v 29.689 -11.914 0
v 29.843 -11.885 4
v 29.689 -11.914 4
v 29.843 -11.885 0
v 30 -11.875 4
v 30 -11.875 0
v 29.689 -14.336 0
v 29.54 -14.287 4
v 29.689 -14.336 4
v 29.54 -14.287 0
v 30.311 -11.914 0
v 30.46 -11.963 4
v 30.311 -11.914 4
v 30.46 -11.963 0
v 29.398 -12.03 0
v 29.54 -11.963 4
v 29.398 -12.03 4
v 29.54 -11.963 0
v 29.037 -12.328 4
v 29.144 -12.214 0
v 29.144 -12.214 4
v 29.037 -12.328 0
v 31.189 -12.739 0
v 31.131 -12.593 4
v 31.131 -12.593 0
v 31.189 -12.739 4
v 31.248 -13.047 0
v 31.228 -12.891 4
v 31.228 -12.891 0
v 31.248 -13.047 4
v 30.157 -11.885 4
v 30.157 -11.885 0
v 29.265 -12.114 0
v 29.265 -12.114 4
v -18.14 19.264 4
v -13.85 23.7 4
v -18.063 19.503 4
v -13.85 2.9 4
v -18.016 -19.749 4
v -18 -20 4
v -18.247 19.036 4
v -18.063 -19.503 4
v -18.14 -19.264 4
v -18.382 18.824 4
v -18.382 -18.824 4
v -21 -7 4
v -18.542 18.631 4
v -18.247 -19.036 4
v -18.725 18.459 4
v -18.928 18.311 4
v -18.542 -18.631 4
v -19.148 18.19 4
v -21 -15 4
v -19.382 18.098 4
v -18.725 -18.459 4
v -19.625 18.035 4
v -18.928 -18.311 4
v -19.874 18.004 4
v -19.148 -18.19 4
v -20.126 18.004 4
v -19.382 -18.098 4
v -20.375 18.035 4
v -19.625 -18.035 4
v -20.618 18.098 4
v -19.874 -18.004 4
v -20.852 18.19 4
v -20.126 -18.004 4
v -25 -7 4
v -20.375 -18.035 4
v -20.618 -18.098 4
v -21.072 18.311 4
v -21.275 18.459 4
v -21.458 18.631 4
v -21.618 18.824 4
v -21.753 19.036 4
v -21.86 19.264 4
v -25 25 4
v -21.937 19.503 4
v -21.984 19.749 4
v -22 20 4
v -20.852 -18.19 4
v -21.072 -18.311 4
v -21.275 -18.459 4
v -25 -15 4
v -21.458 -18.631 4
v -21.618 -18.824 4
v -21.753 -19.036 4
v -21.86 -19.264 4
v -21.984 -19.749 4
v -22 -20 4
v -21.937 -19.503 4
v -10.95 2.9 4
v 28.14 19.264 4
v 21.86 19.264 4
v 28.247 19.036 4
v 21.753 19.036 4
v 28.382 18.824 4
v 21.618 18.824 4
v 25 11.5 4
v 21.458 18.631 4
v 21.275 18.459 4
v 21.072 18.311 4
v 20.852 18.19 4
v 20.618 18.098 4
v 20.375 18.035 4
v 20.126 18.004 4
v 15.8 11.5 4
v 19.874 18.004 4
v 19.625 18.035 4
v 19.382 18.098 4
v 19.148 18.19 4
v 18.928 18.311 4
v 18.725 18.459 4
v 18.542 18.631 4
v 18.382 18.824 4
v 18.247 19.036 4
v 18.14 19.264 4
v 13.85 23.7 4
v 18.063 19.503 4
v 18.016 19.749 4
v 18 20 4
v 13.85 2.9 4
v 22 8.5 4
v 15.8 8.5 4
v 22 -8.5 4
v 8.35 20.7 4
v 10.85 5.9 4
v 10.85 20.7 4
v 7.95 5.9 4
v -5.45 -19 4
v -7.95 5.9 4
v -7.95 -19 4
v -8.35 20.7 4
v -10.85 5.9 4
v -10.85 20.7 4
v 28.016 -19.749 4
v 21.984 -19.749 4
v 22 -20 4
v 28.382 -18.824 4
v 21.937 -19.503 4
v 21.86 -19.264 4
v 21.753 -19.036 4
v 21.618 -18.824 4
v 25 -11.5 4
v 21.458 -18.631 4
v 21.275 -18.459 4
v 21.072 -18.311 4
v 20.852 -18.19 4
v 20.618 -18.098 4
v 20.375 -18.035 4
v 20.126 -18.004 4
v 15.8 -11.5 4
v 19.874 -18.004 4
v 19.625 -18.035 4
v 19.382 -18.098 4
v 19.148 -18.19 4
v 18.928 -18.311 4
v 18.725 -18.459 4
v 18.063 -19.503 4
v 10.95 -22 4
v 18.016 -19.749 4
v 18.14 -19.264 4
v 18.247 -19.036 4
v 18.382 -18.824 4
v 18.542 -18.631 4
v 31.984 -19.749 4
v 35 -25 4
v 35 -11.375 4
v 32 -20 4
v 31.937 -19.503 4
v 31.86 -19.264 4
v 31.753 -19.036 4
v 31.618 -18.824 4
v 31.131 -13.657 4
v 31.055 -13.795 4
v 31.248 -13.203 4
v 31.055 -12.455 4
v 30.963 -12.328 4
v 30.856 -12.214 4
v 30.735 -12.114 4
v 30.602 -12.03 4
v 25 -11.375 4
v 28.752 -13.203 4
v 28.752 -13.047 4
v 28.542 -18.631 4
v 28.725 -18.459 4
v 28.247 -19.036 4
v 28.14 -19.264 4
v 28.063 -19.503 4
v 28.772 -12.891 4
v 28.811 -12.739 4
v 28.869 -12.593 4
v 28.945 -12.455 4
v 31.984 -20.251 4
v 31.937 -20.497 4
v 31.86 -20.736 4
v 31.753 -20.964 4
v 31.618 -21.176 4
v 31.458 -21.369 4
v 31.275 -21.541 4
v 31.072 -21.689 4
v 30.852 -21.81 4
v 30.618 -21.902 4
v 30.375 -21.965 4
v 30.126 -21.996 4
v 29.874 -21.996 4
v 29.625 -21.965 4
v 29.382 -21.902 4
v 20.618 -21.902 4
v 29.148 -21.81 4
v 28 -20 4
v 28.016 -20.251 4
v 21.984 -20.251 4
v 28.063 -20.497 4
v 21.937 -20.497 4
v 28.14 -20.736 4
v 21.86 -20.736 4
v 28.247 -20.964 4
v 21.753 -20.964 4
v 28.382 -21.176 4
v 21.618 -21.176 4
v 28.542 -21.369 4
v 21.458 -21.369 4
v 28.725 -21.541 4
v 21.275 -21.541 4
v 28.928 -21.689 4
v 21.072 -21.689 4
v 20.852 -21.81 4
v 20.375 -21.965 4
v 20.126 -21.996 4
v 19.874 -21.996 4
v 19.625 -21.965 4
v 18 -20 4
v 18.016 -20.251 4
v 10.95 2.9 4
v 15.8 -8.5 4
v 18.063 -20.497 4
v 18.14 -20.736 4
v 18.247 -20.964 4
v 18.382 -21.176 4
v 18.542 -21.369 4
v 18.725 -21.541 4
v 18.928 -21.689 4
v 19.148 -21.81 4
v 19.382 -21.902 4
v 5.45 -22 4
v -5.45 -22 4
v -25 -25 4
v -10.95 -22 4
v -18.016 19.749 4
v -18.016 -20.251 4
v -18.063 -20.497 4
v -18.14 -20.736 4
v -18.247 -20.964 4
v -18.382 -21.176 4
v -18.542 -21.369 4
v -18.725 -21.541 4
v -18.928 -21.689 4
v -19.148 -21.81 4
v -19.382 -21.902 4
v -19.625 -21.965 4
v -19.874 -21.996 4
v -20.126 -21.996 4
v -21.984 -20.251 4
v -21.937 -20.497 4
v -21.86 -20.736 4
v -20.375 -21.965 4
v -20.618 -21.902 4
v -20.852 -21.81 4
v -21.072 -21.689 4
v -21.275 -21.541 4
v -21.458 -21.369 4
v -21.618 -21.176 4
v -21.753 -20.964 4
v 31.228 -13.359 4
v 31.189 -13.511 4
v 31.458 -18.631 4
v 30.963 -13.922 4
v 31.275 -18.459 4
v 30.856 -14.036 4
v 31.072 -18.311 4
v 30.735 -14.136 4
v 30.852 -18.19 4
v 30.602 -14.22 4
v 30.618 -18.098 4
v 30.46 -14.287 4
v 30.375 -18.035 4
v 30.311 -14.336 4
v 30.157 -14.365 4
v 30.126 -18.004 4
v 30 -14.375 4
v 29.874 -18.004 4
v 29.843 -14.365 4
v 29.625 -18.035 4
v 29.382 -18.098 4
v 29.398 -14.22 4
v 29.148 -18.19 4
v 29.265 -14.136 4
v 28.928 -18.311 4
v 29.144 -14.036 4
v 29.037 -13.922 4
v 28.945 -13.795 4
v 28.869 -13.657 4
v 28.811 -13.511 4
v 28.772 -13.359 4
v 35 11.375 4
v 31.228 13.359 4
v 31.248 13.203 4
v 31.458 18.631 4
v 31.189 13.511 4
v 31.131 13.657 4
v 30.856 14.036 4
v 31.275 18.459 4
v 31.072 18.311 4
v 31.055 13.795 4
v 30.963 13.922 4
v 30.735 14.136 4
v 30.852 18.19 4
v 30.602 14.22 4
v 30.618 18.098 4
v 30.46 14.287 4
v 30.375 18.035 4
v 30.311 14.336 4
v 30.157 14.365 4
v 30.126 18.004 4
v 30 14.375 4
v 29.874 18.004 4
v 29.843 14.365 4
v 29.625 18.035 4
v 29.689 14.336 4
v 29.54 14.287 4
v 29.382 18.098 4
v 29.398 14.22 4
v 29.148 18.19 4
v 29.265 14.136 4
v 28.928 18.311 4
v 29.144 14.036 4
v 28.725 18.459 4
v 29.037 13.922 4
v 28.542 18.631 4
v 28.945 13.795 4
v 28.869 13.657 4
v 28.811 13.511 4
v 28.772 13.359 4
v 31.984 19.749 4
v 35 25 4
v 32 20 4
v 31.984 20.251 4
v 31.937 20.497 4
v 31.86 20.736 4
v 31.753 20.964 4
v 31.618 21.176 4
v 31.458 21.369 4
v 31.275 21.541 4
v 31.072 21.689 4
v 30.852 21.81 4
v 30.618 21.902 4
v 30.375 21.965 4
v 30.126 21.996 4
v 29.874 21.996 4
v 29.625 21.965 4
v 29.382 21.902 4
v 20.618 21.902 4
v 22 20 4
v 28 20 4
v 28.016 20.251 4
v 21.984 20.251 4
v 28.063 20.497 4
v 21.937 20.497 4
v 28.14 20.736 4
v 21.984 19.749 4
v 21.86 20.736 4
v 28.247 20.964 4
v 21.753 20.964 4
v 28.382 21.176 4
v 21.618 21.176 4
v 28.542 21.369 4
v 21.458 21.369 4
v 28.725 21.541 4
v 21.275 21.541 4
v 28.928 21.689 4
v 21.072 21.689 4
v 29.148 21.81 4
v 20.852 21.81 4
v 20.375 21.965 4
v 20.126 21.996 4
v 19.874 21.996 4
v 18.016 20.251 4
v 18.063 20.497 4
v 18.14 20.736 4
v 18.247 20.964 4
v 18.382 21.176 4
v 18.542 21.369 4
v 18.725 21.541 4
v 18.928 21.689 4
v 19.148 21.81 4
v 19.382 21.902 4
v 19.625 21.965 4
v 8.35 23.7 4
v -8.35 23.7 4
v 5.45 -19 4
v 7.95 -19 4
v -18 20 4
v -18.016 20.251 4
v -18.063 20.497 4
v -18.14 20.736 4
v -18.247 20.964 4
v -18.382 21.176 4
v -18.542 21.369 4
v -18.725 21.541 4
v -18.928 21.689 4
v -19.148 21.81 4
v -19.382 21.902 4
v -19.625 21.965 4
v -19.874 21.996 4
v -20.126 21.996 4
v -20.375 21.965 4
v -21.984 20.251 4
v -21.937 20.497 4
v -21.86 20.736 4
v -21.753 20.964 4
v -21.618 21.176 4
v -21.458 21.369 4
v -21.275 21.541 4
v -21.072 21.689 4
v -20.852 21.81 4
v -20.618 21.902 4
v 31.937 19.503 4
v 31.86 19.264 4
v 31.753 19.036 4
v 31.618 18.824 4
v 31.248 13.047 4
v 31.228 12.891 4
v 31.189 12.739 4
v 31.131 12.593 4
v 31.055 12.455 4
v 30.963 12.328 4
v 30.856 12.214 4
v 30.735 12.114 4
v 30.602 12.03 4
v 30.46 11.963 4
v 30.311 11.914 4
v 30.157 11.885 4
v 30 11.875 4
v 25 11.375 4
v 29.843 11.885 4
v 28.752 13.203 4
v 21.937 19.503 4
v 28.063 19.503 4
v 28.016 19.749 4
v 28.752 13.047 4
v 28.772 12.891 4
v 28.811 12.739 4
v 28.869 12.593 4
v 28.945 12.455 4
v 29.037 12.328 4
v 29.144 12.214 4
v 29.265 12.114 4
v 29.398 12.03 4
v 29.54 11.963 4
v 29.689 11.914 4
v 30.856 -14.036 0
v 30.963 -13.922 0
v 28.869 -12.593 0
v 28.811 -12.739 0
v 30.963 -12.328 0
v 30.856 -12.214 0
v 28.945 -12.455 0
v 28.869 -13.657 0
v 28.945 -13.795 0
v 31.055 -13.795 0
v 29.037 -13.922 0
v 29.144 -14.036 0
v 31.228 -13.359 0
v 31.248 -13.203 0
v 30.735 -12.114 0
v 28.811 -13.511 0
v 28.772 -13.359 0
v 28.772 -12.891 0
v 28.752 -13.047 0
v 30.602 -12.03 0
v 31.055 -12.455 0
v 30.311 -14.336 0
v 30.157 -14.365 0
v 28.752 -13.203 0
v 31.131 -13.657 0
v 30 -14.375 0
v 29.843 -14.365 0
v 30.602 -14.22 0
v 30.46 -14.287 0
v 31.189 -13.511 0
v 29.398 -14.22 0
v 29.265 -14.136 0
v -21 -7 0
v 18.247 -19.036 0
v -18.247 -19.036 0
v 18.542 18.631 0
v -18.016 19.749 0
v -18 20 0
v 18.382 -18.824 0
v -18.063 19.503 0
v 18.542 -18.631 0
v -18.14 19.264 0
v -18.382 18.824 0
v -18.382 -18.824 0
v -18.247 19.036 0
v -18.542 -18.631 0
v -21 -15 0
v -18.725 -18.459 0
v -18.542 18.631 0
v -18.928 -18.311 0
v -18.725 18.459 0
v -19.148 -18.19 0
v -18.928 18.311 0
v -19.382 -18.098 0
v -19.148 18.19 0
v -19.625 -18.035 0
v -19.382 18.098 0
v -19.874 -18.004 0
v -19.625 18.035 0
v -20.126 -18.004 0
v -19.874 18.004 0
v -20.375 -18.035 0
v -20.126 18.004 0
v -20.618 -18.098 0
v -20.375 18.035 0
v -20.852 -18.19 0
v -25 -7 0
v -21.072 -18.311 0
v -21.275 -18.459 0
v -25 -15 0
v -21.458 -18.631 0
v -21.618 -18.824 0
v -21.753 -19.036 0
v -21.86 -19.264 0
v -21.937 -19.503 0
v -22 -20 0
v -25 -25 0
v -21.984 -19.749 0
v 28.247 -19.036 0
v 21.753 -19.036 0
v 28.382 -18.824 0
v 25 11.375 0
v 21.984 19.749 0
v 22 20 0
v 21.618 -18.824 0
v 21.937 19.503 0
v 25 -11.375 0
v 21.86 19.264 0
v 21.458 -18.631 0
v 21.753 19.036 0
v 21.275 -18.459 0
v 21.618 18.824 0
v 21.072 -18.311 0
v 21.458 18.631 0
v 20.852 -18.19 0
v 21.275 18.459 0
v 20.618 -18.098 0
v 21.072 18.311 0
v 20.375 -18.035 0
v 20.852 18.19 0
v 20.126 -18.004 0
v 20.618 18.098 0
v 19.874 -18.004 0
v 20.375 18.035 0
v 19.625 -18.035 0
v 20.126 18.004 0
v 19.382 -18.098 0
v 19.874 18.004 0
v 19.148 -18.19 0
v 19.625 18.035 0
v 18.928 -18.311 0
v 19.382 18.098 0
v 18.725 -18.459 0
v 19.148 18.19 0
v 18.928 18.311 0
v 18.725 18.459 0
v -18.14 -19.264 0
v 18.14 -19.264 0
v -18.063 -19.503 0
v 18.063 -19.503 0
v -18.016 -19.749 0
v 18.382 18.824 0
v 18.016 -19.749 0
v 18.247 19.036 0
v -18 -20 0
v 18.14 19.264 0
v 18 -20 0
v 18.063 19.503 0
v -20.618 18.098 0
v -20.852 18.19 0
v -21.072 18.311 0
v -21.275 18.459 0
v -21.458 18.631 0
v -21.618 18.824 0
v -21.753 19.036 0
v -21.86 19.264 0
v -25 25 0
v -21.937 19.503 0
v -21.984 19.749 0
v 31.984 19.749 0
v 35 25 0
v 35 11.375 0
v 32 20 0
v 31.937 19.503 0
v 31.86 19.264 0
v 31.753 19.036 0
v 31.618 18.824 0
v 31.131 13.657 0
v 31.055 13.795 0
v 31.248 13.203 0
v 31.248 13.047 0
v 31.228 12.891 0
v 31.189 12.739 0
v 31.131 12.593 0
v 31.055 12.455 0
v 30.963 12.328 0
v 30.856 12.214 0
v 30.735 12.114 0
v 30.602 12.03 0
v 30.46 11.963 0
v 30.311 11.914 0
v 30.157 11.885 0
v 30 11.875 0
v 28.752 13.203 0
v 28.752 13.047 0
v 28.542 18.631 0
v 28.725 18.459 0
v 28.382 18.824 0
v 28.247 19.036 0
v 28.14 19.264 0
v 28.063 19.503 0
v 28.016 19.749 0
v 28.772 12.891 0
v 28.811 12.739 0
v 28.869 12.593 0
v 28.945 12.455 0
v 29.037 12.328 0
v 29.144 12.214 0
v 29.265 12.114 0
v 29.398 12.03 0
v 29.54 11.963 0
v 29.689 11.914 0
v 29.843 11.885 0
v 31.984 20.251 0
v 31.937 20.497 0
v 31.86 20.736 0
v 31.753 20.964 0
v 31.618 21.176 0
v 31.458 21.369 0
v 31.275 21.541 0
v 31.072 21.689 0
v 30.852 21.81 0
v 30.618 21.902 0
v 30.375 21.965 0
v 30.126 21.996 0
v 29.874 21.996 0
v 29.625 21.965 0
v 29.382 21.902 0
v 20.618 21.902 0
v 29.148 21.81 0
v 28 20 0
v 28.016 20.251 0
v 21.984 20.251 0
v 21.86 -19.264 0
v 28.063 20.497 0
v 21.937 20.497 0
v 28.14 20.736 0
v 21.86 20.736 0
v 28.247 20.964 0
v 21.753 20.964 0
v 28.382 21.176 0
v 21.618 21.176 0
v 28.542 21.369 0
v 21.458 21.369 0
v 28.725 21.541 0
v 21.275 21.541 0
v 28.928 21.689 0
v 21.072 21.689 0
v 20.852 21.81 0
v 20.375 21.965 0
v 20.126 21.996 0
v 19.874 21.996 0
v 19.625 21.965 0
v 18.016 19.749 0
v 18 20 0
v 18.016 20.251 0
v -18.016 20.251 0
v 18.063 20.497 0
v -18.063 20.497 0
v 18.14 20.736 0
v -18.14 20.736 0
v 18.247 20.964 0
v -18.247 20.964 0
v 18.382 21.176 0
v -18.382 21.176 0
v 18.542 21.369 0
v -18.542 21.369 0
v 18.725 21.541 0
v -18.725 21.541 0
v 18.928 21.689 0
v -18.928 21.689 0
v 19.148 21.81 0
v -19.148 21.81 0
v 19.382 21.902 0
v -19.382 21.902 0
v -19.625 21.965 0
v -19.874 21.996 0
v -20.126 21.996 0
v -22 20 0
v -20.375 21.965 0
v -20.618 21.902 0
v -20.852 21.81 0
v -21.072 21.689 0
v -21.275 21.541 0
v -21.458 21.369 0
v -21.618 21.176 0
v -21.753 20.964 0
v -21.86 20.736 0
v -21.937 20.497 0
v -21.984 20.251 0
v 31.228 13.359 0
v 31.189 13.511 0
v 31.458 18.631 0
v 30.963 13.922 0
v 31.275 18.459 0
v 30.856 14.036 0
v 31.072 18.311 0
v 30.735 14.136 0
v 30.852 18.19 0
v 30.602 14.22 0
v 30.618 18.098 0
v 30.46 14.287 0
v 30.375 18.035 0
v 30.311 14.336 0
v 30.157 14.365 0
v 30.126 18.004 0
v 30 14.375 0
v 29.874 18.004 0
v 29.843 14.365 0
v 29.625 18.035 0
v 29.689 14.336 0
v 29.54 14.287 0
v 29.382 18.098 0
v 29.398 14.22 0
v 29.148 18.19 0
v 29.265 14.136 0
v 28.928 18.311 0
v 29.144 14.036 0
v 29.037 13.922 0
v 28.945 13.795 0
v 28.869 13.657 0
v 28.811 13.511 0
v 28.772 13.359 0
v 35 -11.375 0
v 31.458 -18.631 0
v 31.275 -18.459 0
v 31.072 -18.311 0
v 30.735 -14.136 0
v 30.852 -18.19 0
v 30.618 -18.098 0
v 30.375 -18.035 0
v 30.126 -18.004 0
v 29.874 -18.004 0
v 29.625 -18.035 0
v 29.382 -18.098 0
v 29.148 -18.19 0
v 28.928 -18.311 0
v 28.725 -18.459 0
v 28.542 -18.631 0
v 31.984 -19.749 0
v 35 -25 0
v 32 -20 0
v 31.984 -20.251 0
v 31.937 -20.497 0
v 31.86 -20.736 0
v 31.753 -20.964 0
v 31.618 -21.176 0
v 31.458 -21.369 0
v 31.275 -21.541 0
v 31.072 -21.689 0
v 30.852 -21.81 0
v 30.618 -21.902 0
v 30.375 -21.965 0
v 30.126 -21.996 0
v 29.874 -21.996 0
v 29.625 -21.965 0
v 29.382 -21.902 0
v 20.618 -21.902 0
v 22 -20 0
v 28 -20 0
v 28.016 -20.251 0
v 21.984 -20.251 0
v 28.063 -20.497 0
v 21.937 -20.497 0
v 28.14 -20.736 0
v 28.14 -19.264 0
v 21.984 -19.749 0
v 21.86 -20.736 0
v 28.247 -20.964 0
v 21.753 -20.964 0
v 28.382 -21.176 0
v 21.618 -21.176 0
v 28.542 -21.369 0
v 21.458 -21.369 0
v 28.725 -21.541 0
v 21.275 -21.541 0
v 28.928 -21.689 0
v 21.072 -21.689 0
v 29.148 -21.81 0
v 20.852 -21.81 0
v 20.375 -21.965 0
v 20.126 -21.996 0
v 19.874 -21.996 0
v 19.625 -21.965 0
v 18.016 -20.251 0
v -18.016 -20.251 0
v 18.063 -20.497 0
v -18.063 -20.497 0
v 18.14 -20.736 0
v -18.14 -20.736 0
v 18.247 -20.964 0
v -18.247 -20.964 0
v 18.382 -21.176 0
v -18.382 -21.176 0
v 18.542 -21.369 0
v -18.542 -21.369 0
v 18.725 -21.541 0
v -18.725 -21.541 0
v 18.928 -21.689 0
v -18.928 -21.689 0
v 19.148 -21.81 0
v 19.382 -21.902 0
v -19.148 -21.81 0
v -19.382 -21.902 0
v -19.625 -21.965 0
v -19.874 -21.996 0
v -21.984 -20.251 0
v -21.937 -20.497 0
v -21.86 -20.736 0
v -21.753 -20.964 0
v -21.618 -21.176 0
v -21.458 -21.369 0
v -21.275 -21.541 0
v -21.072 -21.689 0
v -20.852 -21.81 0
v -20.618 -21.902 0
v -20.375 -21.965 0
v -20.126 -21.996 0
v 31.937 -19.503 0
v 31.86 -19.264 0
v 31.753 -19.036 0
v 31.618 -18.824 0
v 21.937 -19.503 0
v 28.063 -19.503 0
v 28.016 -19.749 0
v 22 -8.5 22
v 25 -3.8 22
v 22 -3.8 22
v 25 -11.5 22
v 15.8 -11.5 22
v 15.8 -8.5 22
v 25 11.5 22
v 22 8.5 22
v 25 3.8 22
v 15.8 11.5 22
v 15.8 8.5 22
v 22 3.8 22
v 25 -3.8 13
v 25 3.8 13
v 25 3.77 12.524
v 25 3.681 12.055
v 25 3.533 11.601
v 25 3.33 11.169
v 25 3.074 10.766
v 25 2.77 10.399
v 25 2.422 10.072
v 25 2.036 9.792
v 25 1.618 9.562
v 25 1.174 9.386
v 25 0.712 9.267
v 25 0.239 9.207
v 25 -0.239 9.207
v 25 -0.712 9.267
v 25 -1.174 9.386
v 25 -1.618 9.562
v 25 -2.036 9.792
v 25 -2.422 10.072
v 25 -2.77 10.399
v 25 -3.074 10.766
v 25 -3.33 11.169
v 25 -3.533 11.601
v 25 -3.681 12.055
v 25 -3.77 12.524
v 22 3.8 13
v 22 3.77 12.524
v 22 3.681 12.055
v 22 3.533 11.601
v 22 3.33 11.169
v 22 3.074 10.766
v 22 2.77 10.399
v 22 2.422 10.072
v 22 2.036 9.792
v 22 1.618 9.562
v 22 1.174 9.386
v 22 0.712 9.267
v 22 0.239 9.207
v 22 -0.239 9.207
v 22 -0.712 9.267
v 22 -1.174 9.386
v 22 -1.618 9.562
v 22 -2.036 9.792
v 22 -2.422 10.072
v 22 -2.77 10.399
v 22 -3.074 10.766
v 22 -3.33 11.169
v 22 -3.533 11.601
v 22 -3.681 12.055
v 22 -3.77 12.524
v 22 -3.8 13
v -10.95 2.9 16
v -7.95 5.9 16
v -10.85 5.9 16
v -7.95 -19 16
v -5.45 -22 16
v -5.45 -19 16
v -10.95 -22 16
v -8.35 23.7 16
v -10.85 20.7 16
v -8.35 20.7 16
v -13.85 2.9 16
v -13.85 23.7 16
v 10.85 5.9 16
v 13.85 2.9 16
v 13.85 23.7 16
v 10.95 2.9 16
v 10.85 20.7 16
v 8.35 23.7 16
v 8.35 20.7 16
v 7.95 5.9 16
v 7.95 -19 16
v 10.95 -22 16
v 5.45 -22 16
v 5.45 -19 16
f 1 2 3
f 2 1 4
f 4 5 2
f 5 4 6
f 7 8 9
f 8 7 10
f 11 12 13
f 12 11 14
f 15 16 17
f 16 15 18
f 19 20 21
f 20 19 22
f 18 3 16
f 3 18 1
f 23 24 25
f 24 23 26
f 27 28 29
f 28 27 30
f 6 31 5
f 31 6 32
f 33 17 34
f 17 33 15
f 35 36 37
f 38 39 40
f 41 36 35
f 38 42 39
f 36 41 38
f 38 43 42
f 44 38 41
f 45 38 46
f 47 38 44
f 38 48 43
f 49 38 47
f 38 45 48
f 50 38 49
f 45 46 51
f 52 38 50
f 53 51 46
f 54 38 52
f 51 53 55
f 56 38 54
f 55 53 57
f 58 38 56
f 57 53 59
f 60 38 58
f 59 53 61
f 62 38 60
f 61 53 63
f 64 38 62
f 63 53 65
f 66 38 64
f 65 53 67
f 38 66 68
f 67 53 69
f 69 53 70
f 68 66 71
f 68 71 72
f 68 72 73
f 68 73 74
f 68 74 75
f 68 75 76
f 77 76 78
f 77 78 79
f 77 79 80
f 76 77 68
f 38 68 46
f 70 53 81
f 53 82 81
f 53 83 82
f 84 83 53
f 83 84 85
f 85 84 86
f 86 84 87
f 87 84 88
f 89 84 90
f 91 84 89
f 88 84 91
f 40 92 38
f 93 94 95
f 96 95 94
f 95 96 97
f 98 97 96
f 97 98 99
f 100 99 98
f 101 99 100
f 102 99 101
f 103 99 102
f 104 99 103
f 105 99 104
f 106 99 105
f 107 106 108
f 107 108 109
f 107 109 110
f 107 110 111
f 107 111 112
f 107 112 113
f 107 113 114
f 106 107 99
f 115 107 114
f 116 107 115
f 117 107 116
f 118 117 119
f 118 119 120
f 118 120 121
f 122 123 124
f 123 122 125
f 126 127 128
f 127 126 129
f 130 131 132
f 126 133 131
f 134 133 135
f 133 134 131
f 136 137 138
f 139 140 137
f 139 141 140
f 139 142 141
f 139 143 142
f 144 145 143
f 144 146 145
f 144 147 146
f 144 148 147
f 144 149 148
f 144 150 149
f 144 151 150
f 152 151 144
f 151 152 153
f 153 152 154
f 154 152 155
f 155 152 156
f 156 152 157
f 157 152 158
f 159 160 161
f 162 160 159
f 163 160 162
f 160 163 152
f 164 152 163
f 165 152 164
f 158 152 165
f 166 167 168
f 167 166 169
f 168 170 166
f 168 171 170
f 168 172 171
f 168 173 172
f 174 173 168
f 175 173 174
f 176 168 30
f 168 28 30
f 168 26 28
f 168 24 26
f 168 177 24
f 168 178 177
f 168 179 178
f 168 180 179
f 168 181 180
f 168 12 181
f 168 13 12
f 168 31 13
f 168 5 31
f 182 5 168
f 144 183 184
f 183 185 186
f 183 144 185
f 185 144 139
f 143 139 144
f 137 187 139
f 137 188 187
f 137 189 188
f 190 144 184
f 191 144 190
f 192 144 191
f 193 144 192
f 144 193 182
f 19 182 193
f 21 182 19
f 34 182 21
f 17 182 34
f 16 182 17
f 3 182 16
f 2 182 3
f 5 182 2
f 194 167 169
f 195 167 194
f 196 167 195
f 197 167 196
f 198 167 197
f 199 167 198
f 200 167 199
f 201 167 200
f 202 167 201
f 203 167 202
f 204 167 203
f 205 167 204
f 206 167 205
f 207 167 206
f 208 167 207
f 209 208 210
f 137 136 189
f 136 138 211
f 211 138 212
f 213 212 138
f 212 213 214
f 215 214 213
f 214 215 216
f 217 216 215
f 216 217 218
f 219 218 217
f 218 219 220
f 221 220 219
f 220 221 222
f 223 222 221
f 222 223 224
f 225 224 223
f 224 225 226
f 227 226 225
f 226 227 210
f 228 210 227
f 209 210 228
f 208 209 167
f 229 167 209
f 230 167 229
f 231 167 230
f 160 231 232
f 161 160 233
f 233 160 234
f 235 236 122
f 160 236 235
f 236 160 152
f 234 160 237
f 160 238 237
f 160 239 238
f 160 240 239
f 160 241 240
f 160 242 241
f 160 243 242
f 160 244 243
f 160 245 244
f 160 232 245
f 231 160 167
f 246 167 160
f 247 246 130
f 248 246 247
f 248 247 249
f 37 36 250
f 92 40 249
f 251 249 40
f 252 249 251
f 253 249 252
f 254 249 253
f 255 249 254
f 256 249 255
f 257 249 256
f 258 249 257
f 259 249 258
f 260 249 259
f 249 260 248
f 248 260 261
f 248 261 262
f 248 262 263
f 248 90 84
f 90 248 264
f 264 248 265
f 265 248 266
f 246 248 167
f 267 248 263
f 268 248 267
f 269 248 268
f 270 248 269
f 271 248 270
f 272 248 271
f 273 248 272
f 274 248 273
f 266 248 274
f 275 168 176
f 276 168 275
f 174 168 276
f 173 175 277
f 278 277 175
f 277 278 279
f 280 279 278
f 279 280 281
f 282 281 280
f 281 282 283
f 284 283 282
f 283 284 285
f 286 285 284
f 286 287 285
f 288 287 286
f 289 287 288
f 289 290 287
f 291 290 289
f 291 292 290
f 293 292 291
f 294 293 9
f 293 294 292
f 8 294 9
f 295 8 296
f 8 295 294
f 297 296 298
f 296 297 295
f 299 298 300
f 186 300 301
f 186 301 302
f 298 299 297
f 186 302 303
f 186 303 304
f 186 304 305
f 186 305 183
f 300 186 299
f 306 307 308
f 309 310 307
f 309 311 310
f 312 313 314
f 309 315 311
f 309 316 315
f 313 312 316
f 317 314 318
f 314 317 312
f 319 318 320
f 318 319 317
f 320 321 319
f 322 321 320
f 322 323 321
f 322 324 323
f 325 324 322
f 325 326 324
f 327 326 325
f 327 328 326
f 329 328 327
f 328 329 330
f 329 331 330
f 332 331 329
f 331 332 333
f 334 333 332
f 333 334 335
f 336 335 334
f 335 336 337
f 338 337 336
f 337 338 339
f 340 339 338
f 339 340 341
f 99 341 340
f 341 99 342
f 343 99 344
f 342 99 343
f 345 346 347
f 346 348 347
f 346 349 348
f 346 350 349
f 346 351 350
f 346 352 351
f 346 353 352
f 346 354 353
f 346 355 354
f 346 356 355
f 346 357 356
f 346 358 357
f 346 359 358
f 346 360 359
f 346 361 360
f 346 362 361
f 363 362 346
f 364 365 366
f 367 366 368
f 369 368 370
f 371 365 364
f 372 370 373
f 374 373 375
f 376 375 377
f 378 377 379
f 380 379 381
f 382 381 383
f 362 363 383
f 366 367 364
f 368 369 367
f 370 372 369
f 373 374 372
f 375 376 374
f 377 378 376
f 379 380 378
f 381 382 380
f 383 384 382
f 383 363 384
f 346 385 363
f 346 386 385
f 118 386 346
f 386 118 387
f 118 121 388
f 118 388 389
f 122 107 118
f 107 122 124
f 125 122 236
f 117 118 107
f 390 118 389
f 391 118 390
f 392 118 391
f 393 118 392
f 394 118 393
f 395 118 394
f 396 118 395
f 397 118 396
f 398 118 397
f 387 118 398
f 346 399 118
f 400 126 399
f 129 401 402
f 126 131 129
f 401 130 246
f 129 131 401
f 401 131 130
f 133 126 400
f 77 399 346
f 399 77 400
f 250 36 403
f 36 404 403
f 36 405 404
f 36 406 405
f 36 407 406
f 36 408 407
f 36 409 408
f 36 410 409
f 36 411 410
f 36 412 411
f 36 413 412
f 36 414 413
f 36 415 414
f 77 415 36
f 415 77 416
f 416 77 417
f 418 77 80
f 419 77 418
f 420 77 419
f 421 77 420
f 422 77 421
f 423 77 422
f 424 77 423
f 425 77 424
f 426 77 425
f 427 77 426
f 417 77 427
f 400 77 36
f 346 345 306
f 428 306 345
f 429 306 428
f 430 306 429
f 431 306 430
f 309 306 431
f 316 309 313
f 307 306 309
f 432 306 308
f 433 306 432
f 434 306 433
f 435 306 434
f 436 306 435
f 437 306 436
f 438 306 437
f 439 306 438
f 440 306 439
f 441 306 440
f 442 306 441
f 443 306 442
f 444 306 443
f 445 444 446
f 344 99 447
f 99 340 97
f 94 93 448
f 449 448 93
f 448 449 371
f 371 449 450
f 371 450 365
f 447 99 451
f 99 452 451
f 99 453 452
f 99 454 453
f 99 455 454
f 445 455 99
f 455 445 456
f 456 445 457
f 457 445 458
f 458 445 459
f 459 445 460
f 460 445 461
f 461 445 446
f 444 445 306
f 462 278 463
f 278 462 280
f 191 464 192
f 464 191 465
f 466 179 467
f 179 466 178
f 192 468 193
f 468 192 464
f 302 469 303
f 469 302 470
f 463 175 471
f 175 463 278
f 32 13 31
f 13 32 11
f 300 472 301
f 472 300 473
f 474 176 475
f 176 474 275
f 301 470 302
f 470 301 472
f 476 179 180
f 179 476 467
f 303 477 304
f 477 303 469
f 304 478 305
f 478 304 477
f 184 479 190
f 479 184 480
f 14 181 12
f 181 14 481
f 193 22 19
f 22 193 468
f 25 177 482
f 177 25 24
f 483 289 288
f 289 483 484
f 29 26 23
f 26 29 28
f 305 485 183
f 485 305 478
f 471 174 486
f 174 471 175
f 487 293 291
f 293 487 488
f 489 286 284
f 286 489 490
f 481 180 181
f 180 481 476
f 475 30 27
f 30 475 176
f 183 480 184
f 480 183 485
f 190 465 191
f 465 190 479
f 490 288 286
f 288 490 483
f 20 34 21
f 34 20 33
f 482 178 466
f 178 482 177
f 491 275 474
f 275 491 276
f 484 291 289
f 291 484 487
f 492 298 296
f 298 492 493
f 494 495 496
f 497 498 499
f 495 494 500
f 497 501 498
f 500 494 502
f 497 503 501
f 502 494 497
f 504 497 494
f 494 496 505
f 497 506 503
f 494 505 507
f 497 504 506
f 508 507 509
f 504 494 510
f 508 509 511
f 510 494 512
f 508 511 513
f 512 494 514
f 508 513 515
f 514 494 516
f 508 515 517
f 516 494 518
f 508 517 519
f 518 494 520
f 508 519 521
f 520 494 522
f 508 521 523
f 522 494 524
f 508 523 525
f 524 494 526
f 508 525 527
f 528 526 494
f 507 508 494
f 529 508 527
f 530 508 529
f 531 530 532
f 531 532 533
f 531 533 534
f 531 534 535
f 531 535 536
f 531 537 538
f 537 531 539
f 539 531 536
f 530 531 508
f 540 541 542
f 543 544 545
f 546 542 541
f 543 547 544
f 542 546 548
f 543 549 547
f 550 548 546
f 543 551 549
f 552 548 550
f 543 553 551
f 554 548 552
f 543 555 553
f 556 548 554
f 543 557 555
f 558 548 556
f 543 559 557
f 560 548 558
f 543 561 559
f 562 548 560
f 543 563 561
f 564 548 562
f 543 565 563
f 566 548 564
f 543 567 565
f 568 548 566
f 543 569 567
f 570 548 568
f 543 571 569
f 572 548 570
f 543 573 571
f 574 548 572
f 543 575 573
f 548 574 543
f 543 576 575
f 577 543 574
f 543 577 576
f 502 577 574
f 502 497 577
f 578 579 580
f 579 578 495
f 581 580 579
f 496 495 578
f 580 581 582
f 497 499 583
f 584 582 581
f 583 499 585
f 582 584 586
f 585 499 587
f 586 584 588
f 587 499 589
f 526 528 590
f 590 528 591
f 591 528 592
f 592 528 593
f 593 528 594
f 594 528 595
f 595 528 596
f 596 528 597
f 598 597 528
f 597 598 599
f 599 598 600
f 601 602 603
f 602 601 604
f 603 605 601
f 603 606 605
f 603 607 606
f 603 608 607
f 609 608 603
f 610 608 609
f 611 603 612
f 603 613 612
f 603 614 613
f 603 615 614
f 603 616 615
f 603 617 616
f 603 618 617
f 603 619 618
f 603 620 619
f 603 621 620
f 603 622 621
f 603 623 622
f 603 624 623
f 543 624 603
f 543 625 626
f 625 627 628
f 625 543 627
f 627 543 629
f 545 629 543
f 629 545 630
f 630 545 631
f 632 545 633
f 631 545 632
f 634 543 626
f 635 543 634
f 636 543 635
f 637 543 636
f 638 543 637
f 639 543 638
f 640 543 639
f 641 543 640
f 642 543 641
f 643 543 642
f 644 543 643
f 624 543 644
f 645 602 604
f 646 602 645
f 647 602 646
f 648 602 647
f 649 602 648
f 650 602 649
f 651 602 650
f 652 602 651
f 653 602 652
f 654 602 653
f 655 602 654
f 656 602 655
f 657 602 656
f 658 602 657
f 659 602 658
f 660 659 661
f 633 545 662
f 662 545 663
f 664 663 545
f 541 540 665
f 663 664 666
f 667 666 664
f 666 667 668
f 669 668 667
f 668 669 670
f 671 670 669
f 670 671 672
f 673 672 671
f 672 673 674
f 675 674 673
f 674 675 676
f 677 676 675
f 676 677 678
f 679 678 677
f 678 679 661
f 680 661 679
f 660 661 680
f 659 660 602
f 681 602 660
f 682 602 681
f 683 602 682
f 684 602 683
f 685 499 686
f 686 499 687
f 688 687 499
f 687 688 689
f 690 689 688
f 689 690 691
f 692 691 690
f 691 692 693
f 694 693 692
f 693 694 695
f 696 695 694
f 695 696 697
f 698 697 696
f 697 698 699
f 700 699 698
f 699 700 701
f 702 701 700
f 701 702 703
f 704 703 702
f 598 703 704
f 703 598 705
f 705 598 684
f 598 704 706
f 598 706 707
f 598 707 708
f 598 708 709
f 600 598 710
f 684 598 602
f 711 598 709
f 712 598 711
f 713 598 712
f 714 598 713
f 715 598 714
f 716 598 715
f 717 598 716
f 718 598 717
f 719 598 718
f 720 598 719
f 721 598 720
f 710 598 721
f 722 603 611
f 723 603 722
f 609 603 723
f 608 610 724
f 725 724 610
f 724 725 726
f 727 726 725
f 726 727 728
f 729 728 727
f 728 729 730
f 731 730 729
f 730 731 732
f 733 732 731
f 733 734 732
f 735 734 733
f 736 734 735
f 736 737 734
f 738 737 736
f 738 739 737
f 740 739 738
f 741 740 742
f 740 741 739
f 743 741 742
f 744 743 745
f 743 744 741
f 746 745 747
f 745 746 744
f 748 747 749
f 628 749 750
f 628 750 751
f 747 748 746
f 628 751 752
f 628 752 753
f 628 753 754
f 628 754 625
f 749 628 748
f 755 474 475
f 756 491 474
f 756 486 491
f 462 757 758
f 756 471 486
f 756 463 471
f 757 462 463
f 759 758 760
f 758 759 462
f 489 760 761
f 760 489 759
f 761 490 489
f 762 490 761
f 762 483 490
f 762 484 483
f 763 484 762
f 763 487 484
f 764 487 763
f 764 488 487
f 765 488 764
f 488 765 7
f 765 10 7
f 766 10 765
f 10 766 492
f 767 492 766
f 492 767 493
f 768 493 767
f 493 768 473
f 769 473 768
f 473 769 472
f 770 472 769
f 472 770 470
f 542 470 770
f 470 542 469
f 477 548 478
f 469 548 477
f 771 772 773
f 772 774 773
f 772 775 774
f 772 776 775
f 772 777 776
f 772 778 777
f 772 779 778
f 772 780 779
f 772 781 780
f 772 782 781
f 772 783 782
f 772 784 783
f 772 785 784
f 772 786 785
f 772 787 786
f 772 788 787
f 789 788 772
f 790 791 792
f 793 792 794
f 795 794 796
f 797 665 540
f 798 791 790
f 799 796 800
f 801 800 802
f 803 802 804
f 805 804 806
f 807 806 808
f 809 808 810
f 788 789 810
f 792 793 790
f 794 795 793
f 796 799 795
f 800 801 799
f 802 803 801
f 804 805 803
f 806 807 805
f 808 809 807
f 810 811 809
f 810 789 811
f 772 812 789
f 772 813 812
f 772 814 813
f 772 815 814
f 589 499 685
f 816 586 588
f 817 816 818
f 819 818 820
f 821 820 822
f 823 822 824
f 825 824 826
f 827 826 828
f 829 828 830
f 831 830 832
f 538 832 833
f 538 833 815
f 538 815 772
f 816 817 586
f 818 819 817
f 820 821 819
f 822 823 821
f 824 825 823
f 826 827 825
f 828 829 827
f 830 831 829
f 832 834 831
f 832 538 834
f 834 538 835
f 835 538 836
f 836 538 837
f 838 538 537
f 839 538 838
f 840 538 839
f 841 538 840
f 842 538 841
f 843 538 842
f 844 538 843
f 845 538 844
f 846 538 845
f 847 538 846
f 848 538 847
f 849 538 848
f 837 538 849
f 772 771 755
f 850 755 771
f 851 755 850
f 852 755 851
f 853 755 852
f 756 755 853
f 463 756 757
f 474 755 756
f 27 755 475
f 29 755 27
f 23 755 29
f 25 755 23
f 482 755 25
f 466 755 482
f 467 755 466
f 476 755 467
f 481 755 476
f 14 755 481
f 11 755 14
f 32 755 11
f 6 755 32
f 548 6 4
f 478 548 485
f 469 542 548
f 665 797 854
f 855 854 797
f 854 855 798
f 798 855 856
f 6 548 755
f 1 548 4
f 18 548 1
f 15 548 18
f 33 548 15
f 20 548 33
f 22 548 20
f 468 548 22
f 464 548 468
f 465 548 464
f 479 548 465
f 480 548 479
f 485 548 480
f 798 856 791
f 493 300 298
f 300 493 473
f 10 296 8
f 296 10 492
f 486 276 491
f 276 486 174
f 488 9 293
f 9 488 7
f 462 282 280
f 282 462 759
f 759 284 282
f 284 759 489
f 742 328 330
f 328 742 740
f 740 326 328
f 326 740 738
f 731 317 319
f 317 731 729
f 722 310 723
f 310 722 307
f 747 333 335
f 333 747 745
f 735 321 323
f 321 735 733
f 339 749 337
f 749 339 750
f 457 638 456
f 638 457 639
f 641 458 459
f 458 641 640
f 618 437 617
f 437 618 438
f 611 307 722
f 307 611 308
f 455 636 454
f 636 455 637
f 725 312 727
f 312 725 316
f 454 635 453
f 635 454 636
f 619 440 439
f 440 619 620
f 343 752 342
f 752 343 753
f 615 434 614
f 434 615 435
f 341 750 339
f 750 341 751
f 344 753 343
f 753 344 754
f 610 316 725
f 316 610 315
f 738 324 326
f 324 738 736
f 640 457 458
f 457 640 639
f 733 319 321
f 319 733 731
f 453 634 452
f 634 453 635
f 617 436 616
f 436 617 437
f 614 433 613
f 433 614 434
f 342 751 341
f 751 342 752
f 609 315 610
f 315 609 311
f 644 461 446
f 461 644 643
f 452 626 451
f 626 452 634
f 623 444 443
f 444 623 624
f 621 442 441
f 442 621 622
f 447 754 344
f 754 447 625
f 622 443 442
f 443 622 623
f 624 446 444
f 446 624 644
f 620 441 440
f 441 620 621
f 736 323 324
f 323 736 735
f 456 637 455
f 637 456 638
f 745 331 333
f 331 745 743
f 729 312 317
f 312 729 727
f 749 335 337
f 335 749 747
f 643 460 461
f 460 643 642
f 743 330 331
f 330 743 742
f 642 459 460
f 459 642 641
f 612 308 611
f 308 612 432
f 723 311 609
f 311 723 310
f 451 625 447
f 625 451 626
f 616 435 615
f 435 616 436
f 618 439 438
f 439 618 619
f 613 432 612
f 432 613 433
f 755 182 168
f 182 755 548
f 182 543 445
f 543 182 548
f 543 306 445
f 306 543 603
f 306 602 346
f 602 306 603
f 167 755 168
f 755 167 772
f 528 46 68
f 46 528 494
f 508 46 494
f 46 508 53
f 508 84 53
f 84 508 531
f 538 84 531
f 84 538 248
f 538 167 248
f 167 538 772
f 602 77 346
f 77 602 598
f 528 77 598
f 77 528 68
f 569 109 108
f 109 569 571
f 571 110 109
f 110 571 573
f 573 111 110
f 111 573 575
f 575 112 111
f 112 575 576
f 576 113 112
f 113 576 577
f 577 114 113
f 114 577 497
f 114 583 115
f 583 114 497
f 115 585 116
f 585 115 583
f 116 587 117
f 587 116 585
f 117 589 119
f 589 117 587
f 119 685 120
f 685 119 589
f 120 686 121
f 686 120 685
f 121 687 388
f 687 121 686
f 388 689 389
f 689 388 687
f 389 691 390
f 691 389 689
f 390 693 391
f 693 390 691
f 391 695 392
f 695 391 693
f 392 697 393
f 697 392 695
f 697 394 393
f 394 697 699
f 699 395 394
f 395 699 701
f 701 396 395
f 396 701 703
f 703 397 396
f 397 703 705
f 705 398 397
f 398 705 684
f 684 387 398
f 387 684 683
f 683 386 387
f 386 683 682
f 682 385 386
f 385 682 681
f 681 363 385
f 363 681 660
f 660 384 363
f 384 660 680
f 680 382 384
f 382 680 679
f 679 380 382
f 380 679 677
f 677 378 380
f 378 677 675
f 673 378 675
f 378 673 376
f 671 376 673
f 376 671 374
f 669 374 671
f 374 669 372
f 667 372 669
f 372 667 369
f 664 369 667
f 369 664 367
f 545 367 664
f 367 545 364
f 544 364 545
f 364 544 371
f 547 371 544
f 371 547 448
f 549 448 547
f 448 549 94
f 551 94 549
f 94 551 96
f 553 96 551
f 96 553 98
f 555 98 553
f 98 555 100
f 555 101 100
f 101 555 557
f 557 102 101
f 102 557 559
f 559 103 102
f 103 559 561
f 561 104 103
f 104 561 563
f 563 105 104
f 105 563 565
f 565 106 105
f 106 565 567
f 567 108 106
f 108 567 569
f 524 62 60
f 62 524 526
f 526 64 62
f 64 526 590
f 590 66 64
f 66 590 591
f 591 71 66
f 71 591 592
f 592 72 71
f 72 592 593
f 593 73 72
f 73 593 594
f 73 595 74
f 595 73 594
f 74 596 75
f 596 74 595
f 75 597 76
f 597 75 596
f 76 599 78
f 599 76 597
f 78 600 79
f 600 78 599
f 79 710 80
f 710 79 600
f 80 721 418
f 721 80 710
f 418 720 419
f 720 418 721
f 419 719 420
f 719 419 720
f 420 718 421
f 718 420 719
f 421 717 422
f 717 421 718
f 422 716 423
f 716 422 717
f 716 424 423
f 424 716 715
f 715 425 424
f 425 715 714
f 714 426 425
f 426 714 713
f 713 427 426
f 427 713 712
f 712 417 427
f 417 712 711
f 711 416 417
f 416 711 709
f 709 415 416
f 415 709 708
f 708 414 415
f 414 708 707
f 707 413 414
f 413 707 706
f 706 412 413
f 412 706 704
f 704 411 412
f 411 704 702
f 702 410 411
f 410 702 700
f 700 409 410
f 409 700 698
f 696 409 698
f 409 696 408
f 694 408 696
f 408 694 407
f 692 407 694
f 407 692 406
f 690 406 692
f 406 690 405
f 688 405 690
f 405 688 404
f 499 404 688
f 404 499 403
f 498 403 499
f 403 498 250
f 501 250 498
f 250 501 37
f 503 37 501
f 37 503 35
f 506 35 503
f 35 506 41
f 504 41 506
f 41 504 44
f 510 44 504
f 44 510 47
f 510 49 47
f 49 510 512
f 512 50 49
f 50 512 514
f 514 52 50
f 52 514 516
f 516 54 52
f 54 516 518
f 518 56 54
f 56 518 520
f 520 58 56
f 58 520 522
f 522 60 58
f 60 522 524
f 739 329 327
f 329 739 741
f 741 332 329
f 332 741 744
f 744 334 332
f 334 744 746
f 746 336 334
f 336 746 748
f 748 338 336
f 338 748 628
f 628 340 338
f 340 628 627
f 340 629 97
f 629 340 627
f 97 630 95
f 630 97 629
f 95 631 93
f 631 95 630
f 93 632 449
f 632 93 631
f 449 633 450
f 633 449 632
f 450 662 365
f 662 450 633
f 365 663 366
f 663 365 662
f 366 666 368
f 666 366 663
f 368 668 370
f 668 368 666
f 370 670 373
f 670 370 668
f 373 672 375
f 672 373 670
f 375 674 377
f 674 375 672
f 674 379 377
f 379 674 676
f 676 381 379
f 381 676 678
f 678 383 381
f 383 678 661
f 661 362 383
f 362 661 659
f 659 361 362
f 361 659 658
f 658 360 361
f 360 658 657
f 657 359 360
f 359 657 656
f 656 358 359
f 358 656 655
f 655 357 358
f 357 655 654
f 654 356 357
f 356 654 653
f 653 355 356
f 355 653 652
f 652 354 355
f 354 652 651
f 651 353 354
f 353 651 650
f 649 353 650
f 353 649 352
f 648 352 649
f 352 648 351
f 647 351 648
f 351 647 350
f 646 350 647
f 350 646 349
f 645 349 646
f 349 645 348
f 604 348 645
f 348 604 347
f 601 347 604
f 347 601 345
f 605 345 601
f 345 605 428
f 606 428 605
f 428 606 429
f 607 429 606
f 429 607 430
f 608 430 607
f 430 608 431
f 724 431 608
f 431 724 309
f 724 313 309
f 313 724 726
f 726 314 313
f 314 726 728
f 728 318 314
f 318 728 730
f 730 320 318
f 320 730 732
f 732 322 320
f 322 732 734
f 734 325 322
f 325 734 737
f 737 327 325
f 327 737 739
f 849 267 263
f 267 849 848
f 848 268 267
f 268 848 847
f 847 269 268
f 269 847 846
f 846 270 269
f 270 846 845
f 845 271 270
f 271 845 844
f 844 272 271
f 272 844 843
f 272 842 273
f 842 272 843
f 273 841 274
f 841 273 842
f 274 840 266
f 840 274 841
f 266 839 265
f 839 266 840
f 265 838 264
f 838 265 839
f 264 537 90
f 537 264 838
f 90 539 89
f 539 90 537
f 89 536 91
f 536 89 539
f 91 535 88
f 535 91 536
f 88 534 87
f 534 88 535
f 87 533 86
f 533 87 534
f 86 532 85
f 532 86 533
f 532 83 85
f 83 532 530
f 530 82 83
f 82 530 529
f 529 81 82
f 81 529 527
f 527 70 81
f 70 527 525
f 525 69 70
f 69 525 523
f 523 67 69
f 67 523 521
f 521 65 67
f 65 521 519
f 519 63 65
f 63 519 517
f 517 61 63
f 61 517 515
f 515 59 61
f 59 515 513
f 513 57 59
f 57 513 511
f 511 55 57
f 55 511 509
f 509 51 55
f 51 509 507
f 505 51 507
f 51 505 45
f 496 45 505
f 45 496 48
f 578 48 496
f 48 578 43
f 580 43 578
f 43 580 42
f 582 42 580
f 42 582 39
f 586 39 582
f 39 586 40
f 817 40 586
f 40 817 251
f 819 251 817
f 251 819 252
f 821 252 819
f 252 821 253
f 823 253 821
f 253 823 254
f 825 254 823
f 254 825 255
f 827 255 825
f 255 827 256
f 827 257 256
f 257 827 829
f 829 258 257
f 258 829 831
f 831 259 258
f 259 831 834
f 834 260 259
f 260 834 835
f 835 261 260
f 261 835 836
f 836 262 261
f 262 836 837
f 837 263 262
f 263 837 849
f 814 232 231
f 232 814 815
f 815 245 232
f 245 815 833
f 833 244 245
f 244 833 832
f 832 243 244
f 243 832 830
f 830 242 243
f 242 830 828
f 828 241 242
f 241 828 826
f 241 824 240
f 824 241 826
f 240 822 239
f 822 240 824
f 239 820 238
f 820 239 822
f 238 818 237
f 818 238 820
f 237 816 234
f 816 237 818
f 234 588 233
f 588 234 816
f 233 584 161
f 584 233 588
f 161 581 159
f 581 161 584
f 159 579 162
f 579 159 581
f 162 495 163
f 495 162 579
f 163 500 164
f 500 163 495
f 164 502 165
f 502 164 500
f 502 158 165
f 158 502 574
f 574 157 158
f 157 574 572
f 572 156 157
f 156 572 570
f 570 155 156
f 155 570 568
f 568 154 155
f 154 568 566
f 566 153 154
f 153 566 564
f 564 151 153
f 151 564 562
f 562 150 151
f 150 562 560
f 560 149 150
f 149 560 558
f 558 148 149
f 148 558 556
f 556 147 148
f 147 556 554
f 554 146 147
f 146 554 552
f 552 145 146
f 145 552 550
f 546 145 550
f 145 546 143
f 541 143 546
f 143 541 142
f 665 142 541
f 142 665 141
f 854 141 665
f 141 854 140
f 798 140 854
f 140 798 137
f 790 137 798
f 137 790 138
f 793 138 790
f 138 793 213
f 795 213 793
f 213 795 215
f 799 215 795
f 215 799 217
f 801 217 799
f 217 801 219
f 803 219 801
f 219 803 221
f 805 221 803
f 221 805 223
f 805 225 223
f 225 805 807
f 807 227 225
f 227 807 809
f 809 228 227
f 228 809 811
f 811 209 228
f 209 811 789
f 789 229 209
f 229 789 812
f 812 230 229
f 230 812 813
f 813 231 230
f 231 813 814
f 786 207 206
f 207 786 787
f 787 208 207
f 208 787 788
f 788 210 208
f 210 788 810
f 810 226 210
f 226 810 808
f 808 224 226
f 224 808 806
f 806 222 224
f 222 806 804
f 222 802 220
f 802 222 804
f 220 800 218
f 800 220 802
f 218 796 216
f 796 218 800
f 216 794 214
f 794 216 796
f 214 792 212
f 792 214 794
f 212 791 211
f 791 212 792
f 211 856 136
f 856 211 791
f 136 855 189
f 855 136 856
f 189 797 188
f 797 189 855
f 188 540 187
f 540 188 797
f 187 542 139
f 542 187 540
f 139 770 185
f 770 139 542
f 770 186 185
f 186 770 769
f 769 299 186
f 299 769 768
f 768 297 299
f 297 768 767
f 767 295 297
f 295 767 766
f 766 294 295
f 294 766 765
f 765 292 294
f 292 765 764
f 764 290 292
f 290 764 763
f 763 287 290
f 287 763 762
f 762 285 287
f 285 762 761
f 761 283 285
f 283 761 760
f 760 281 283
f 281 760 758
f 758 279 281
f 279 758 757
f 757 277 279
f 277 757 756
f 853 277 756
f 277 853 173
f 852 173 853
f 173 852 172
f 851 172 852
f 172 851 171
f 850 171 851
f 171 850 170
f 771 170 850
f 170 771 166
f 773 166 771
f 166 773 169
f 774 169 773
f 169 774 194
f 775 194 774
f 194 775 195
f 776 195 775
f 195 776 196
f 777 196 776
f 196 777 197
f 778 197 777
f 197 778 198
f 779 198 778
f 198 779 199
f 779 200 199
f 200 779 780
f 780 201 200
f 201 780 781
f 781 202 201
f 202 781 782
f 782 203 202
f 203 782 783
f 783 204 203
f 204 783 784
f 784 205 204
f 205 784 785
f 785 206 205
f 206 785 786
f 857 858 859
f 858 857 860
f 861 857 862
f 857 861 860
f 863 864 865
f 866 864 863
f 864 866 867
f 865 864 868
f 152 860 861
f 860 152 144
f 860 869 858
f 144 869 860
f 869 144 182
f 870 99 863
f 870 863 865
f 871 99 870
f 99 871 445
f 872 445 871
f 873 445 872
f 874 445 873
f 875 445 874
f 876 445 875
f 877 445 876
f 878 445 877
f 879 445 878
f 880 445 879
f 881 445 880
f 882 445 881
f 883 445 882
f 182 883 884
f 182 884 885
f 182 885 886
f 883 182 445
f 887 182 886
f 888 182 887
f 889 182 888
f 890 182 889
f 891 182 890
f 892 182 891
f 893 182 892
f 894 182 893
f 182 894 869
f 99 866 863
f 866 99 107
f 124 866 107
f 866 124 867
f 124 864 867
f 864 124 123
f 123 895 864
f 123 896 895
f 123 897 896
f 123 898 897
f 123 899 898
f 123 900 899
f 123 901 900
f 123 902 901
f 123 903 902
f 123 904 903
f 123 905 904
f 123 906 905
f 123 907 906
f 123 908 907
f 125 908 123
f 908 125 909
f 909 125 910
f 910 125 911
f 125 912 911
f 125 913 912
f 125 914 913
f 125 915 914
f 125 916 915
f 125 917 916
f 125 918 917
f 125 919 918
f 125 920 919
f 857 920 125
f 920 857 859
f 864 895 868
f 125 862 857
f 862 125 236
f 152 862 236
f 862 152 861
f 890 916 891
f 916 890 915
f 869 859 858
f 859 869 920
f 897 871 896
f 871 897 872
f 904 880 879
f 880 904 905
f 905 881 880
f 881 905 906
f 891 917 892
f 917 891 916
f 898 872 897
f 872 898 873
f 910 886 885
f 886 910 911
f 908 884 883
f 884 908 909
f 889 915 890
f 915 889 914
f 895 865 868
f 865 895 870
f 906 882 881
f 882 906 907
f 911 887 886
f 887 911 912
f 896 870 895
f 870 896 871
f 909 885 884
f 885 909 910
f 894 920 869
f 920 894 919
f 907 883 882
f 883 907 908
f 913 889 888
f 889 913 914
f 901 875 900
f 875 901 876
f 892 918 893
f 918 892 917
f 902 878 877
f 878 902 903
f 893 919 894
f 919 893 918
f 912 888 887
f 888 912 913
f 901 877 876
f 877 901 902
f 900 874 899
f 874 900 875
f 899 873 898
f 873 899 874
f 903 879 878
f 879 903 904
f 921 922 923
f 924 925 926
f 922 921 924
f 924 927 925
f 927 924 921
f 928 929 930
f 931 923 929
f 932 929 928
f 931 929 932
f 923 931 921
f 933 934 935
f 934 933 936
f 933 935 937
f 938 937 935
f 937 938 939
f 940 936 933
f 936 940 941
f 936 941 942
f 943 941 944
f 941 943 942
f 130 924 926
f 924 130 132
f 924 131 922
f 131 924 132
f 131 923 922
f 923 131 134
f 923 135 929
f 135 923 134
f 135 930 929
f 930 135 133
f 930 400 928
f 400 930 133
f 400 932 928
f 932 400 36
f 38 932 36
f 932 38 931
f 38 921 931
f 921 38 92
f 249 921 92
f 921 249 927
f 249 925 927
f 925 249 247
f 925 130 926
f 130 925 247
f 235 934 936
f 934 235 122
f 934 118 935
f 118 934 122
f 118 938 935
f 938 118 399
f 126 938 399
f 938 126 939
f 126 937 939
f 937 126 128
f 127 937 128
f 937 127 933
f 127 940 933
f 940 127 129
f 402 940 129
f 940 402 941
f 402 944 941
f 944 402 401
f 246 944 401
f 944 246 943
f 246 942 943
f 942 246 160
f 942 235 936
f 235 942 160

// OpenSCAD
// file: Constants.scad
// General
smoothness = 50;        // Circle resolution
hole_tolerance = 0.5;    // 0.5mm tolerance for holes

manufacturer_tolerance = 0.4;

// PCB dimensions
pcb_size = 50;           // 5cm square PCB
extrude_height = 4;     // 4mm extrusion height


display_module_width = 10;        // Width (shorter side)

mainboard_thickness = 4;
lcd_holder_width = display_module_width;
// file: Potentiometer.scad
include <Constants.scad>

// Parameters
clearance_extra = 3;  // Extra clearance for wires, solder joints, and mounting tolerance

// Potentiometer body dimensions (from datasheet with added clearance)
pot_body_width = 17; 
pot_body_height = pot_body_width/2+13 ;//+ clearance_extra;  
pot_thickness_no_shaft = 9.2;
// Support structure dimensions
support_thickness = 3;
support_height = pot_body_width +1;   // Height of extrusion in z axis plus extra space
side_support_length = pot_thickness_no_shaft;              // Depth of bracing perpendicular to main support

// Cutout for potentiometer shaft
shaft_diameter = 7.2 + manufacturer_tolerance;

module potentiometer_holder_without_mounting_hole_3d() {
    linear_extrude(height = support_height) {
        // Main horizontal strip that holds potentiometer body
        translate([0, support_thickness/2, 0]) {
            square([pot_body_width, support_thickness], center = true);
        }
        
        // Right side support
        translate([
            pot_body_width/2 + support_thickness/2,
            side_support_length/2,
            0
        ]) {
            square([support_thickness, side_support_length], center = true);
        }
        
        // Left side support (mirrored)
        translate([
            -pot_body_width/2 - support_thickness/2,
            side_support_length/2,
            0
        ]) {
            square([support_thickness, side_support_length], center = true);
        }
    }
}

module potentiometer_mounting_hole_2d() {
    translate([0, support_height/2 + support_height/4, 0]) {
        square([shaft_diameter, support_height/2], center = true);
    }
    
    translate([0, support_height/2, 0]) {
        circle(d = shaft_diameter);
    }
}

module potentiometer_mounting_hole_3d() {
    translate([0, support_thickness, 0]) {
        rotate([90, 0, 0]) {
            linear_extrude(height = support_thickness) {
                potentiometer_mounting_hole_2d();
            }
        }
    }
}

module potentiometer_holder_3d() {
    difference() {
        potentiometer_holder_without_mounting_hole_3d();
        potentiometer_mounting_hole_3d();
    }
}

// Uncomment to test:
// potentiometer_mounting_hole_2d();
// potentiometer_holder_3d();
// file: Display.scad
include <Constants.scad>

// Cutout for PCB to make space for electronic components on display module
display_module_length = 22.75;    // Length (longer side)

// Mounting hole parameters from product description
mounting_hole_diameter = 2 + hole_tolerance;      // 2mm post diameter
mounting_hole_distance = 1.75;   // 1.75mm from border to post center

// Base rectangle
module base_rectangle() {
    linear_extrude(height = extrude_height) {
        square([display_module_length, display_module_width], center = true);
    }
}

// Single mounting post
module mounting_post(x, y) {
    translate([x, y, 0]) 
        cylinder(h = extrude_height, d = mounting_hole_diameter);
}

// Both posts on shorter sides
module mounting_posts() {
    // Posts on shorter sides, positioned at mounting_hole_distance from edge
    x_position = display_module_length / 2 + mounting_hole_distance;
    
    // Left side post
    mounting_post(-x_position, 0);
    
    // Right side post
    mounting_post(x_position, 0);
}

// Main assembly
module display_holder_3d() {
    // Position vertically with left side at x=0 for easier placement
    translate([-display_module_width/2, 0, 0]) {
        rotate([0, 0, 90]) {
            union() {
                base_rectangle();
                mounting_posts();
            }
        }
    }
}

//display_holder_3d();
// file: PumpHolder.scad
include <Constants.scad>

// ---------------- Parameters ----------------
pump_thickness_z = 12; // part thickness (Z)
rail_t           = 3;  // rail thickness in XY
tongue_len       = 2.5; // small horizontal tabs length

// Drawing-based dimensions (XY)
total_h = 38.8 + 0.5 + manufacturer_tolerance;

head_w  = 21.0 + 0.3 + manufacturer_tolerance;
head_h  = 14.1 + 0.3 + manufacturer_tolerance;

motor_w = 15.3 + 0.2 + manufacturer_tolerance;
motor_h = total_h - head_h;

// ---------------- 2D geometry ----------------
module side_rail_2d() {
  // Left side only; mirrored later for the right side
  union() {
    // bottom horizontal tab (motor cable side)
    translate([-motor_w/2 - rail_t, 0])
      square([rail_t + tongue_len, rail_t]);

    // top horizontal tab (pipe side)
    translate([-head_w/2- rail_t, total_h + rail_t])
      square([rail_t + tongue_len, rail_t]);

    // horizontal step at transition motor -> head
    translate([-head_w/2- rail_t, motor_h])
      square([(head_w - motor_w)/2, rail_t]);

    // vertical rail along motor
    translate([-motor_w/2 - rail_t, rail_t])
      square([rail_t, motor_h]);

    // vertical rail along head
    translate([-head_w/2- rail_t, motor_h + rail_t])
      square([rail_t, head_h]);
  }
}

module rails_2d() {
  union() {
    side_rail_2d();                 // left
    mirror([1,0,0]) side_rail_2d(); // right
  }
}


module pump_rails_3d ()
{
  linear_extrude(height = pump_thickness_z)
    rails_2d();

}
// ---------------- 3D extrusion ----------------
//module holder_3d() {
//  linear_extrude(height = pump_thickness_z)
//    rails_2d();
//}
 //rails_2d();
//holder_3d();
// file: MountingBoard.scad
include <Constants.scad>

// Parameters
hole_distance = 5;       // 5mm from PCB edge
hole_diameter = 3.5;     // 3.5mm hole diameter

// Edge cutout parameters
cutout_x_start = 0;
cutout_x_end = 4;
cutout_y_start = 10;
cutout_y_end = 18;
cutout_width = cutout_x_end - cutout_x_start;
cutout_height = cutout_y_end - cutout_y_start;

// PCB base shape (2D)
module pcb_base() {
    square([pcb_size, pcb_size], center = true);
}

// Extra area for LCD and potentiometer mounting
module lcd_base() {
    translate([pcb_size/2 + lcd_holder_width/2, 0, 0]) 
        square([lcd_holder_width, pcb_size], center = true);
}

// Single mounting hole (2D)
module mounting_hole_2d(x, y) {
    actual_diameter = hole_diameter + hole_tolerance;
    translate([x, y, 0]) 
        circle(d = actual_diameter);
}

// All mounting holes (2D)
module mounting_holes_2d() {
    half_size = pcb_size / 2;
    
    // PCB mounting holes
    mounting_hole_2d(-half_size + hole_distance, -half_size + hole_distance);  // Bottom-left
    mounting_hole_2d(half_size - hole_distance, -half_size + hole_distance);   // Bottom-right
    mounting_hole_2d(half_size - hole_distance, half_size - hole_distance);    // Top-right
    mounting_hole_2d(-half_size + hole_distance, half_size - hole_distance);   // Top-left
}

// Cutout for pump wires
module pump_wires_cutout_2d() {
    half_size = pcb_size / 2;
    
    translate([cutout_x_start - half_size, cutout_y_start - half_size, 0])
        square([cutout_width, cutout_height]);
}

// LCD holder with mounting holes
module lcd_holder_2d() {
    half_size = pcb_size / 2;
    
    difference() {
        lcd_base();
        // Outside holes on the LCD side
        mounting_hole_2d(half_size + lcd_holder_width - hole_distance, half_size - hole_distance);
        mounting_hole_2d(half_size + lcd_holder_width - hole_distance, -half_size + hole_distance);
    }
}

// Main 2D mounting board
module mounting_board_2d() {

    union ()
    {
  difference() {
        pcb_base();
        mounting_holes_2d();
        pump_wires_cutout_2d();
    }
    lcd_holder_2d();
    }
  
}

// 3D extruded version
module mounting_board_3d() {
    linear_extrude(height = mainboard_thickness) {
        mounting_board_2d();
    }
}

// Uncomment one of the following to render:
// mounting_board_2d();  // For 2D view
// mounting_board_3d();  // For 3D extruded version
// main file
include <MountingBoard.scad>
include <PumpHolder.scad>
include <Display.scad>
include <Potentiometer.scad>

$fn = smoothness;

difference()
{
    mounting_board_3d();
    
    translate([pcb_size/2 +lcd_holder_width, 0, 0]) {
       // rotate([0, 0, 90]) {
            display_holder_3d();
       // }
    }
}

// Position on mainboard with thickness, roughly centered to save space
arbitrary_y_offset_for_fitting = 3;
translate([0, -pcb_size/2 + arbitrary_y_offset_for_fitting, mainboard_thickness]) {
    pump_rails_3d();
}

translate([pcb_size/2/*+lcd_holder_width*/,0 , mainboard_thickness])
{
rotate([0, 0, 90]) {
    potentiometer_holder_3d();
}
}
